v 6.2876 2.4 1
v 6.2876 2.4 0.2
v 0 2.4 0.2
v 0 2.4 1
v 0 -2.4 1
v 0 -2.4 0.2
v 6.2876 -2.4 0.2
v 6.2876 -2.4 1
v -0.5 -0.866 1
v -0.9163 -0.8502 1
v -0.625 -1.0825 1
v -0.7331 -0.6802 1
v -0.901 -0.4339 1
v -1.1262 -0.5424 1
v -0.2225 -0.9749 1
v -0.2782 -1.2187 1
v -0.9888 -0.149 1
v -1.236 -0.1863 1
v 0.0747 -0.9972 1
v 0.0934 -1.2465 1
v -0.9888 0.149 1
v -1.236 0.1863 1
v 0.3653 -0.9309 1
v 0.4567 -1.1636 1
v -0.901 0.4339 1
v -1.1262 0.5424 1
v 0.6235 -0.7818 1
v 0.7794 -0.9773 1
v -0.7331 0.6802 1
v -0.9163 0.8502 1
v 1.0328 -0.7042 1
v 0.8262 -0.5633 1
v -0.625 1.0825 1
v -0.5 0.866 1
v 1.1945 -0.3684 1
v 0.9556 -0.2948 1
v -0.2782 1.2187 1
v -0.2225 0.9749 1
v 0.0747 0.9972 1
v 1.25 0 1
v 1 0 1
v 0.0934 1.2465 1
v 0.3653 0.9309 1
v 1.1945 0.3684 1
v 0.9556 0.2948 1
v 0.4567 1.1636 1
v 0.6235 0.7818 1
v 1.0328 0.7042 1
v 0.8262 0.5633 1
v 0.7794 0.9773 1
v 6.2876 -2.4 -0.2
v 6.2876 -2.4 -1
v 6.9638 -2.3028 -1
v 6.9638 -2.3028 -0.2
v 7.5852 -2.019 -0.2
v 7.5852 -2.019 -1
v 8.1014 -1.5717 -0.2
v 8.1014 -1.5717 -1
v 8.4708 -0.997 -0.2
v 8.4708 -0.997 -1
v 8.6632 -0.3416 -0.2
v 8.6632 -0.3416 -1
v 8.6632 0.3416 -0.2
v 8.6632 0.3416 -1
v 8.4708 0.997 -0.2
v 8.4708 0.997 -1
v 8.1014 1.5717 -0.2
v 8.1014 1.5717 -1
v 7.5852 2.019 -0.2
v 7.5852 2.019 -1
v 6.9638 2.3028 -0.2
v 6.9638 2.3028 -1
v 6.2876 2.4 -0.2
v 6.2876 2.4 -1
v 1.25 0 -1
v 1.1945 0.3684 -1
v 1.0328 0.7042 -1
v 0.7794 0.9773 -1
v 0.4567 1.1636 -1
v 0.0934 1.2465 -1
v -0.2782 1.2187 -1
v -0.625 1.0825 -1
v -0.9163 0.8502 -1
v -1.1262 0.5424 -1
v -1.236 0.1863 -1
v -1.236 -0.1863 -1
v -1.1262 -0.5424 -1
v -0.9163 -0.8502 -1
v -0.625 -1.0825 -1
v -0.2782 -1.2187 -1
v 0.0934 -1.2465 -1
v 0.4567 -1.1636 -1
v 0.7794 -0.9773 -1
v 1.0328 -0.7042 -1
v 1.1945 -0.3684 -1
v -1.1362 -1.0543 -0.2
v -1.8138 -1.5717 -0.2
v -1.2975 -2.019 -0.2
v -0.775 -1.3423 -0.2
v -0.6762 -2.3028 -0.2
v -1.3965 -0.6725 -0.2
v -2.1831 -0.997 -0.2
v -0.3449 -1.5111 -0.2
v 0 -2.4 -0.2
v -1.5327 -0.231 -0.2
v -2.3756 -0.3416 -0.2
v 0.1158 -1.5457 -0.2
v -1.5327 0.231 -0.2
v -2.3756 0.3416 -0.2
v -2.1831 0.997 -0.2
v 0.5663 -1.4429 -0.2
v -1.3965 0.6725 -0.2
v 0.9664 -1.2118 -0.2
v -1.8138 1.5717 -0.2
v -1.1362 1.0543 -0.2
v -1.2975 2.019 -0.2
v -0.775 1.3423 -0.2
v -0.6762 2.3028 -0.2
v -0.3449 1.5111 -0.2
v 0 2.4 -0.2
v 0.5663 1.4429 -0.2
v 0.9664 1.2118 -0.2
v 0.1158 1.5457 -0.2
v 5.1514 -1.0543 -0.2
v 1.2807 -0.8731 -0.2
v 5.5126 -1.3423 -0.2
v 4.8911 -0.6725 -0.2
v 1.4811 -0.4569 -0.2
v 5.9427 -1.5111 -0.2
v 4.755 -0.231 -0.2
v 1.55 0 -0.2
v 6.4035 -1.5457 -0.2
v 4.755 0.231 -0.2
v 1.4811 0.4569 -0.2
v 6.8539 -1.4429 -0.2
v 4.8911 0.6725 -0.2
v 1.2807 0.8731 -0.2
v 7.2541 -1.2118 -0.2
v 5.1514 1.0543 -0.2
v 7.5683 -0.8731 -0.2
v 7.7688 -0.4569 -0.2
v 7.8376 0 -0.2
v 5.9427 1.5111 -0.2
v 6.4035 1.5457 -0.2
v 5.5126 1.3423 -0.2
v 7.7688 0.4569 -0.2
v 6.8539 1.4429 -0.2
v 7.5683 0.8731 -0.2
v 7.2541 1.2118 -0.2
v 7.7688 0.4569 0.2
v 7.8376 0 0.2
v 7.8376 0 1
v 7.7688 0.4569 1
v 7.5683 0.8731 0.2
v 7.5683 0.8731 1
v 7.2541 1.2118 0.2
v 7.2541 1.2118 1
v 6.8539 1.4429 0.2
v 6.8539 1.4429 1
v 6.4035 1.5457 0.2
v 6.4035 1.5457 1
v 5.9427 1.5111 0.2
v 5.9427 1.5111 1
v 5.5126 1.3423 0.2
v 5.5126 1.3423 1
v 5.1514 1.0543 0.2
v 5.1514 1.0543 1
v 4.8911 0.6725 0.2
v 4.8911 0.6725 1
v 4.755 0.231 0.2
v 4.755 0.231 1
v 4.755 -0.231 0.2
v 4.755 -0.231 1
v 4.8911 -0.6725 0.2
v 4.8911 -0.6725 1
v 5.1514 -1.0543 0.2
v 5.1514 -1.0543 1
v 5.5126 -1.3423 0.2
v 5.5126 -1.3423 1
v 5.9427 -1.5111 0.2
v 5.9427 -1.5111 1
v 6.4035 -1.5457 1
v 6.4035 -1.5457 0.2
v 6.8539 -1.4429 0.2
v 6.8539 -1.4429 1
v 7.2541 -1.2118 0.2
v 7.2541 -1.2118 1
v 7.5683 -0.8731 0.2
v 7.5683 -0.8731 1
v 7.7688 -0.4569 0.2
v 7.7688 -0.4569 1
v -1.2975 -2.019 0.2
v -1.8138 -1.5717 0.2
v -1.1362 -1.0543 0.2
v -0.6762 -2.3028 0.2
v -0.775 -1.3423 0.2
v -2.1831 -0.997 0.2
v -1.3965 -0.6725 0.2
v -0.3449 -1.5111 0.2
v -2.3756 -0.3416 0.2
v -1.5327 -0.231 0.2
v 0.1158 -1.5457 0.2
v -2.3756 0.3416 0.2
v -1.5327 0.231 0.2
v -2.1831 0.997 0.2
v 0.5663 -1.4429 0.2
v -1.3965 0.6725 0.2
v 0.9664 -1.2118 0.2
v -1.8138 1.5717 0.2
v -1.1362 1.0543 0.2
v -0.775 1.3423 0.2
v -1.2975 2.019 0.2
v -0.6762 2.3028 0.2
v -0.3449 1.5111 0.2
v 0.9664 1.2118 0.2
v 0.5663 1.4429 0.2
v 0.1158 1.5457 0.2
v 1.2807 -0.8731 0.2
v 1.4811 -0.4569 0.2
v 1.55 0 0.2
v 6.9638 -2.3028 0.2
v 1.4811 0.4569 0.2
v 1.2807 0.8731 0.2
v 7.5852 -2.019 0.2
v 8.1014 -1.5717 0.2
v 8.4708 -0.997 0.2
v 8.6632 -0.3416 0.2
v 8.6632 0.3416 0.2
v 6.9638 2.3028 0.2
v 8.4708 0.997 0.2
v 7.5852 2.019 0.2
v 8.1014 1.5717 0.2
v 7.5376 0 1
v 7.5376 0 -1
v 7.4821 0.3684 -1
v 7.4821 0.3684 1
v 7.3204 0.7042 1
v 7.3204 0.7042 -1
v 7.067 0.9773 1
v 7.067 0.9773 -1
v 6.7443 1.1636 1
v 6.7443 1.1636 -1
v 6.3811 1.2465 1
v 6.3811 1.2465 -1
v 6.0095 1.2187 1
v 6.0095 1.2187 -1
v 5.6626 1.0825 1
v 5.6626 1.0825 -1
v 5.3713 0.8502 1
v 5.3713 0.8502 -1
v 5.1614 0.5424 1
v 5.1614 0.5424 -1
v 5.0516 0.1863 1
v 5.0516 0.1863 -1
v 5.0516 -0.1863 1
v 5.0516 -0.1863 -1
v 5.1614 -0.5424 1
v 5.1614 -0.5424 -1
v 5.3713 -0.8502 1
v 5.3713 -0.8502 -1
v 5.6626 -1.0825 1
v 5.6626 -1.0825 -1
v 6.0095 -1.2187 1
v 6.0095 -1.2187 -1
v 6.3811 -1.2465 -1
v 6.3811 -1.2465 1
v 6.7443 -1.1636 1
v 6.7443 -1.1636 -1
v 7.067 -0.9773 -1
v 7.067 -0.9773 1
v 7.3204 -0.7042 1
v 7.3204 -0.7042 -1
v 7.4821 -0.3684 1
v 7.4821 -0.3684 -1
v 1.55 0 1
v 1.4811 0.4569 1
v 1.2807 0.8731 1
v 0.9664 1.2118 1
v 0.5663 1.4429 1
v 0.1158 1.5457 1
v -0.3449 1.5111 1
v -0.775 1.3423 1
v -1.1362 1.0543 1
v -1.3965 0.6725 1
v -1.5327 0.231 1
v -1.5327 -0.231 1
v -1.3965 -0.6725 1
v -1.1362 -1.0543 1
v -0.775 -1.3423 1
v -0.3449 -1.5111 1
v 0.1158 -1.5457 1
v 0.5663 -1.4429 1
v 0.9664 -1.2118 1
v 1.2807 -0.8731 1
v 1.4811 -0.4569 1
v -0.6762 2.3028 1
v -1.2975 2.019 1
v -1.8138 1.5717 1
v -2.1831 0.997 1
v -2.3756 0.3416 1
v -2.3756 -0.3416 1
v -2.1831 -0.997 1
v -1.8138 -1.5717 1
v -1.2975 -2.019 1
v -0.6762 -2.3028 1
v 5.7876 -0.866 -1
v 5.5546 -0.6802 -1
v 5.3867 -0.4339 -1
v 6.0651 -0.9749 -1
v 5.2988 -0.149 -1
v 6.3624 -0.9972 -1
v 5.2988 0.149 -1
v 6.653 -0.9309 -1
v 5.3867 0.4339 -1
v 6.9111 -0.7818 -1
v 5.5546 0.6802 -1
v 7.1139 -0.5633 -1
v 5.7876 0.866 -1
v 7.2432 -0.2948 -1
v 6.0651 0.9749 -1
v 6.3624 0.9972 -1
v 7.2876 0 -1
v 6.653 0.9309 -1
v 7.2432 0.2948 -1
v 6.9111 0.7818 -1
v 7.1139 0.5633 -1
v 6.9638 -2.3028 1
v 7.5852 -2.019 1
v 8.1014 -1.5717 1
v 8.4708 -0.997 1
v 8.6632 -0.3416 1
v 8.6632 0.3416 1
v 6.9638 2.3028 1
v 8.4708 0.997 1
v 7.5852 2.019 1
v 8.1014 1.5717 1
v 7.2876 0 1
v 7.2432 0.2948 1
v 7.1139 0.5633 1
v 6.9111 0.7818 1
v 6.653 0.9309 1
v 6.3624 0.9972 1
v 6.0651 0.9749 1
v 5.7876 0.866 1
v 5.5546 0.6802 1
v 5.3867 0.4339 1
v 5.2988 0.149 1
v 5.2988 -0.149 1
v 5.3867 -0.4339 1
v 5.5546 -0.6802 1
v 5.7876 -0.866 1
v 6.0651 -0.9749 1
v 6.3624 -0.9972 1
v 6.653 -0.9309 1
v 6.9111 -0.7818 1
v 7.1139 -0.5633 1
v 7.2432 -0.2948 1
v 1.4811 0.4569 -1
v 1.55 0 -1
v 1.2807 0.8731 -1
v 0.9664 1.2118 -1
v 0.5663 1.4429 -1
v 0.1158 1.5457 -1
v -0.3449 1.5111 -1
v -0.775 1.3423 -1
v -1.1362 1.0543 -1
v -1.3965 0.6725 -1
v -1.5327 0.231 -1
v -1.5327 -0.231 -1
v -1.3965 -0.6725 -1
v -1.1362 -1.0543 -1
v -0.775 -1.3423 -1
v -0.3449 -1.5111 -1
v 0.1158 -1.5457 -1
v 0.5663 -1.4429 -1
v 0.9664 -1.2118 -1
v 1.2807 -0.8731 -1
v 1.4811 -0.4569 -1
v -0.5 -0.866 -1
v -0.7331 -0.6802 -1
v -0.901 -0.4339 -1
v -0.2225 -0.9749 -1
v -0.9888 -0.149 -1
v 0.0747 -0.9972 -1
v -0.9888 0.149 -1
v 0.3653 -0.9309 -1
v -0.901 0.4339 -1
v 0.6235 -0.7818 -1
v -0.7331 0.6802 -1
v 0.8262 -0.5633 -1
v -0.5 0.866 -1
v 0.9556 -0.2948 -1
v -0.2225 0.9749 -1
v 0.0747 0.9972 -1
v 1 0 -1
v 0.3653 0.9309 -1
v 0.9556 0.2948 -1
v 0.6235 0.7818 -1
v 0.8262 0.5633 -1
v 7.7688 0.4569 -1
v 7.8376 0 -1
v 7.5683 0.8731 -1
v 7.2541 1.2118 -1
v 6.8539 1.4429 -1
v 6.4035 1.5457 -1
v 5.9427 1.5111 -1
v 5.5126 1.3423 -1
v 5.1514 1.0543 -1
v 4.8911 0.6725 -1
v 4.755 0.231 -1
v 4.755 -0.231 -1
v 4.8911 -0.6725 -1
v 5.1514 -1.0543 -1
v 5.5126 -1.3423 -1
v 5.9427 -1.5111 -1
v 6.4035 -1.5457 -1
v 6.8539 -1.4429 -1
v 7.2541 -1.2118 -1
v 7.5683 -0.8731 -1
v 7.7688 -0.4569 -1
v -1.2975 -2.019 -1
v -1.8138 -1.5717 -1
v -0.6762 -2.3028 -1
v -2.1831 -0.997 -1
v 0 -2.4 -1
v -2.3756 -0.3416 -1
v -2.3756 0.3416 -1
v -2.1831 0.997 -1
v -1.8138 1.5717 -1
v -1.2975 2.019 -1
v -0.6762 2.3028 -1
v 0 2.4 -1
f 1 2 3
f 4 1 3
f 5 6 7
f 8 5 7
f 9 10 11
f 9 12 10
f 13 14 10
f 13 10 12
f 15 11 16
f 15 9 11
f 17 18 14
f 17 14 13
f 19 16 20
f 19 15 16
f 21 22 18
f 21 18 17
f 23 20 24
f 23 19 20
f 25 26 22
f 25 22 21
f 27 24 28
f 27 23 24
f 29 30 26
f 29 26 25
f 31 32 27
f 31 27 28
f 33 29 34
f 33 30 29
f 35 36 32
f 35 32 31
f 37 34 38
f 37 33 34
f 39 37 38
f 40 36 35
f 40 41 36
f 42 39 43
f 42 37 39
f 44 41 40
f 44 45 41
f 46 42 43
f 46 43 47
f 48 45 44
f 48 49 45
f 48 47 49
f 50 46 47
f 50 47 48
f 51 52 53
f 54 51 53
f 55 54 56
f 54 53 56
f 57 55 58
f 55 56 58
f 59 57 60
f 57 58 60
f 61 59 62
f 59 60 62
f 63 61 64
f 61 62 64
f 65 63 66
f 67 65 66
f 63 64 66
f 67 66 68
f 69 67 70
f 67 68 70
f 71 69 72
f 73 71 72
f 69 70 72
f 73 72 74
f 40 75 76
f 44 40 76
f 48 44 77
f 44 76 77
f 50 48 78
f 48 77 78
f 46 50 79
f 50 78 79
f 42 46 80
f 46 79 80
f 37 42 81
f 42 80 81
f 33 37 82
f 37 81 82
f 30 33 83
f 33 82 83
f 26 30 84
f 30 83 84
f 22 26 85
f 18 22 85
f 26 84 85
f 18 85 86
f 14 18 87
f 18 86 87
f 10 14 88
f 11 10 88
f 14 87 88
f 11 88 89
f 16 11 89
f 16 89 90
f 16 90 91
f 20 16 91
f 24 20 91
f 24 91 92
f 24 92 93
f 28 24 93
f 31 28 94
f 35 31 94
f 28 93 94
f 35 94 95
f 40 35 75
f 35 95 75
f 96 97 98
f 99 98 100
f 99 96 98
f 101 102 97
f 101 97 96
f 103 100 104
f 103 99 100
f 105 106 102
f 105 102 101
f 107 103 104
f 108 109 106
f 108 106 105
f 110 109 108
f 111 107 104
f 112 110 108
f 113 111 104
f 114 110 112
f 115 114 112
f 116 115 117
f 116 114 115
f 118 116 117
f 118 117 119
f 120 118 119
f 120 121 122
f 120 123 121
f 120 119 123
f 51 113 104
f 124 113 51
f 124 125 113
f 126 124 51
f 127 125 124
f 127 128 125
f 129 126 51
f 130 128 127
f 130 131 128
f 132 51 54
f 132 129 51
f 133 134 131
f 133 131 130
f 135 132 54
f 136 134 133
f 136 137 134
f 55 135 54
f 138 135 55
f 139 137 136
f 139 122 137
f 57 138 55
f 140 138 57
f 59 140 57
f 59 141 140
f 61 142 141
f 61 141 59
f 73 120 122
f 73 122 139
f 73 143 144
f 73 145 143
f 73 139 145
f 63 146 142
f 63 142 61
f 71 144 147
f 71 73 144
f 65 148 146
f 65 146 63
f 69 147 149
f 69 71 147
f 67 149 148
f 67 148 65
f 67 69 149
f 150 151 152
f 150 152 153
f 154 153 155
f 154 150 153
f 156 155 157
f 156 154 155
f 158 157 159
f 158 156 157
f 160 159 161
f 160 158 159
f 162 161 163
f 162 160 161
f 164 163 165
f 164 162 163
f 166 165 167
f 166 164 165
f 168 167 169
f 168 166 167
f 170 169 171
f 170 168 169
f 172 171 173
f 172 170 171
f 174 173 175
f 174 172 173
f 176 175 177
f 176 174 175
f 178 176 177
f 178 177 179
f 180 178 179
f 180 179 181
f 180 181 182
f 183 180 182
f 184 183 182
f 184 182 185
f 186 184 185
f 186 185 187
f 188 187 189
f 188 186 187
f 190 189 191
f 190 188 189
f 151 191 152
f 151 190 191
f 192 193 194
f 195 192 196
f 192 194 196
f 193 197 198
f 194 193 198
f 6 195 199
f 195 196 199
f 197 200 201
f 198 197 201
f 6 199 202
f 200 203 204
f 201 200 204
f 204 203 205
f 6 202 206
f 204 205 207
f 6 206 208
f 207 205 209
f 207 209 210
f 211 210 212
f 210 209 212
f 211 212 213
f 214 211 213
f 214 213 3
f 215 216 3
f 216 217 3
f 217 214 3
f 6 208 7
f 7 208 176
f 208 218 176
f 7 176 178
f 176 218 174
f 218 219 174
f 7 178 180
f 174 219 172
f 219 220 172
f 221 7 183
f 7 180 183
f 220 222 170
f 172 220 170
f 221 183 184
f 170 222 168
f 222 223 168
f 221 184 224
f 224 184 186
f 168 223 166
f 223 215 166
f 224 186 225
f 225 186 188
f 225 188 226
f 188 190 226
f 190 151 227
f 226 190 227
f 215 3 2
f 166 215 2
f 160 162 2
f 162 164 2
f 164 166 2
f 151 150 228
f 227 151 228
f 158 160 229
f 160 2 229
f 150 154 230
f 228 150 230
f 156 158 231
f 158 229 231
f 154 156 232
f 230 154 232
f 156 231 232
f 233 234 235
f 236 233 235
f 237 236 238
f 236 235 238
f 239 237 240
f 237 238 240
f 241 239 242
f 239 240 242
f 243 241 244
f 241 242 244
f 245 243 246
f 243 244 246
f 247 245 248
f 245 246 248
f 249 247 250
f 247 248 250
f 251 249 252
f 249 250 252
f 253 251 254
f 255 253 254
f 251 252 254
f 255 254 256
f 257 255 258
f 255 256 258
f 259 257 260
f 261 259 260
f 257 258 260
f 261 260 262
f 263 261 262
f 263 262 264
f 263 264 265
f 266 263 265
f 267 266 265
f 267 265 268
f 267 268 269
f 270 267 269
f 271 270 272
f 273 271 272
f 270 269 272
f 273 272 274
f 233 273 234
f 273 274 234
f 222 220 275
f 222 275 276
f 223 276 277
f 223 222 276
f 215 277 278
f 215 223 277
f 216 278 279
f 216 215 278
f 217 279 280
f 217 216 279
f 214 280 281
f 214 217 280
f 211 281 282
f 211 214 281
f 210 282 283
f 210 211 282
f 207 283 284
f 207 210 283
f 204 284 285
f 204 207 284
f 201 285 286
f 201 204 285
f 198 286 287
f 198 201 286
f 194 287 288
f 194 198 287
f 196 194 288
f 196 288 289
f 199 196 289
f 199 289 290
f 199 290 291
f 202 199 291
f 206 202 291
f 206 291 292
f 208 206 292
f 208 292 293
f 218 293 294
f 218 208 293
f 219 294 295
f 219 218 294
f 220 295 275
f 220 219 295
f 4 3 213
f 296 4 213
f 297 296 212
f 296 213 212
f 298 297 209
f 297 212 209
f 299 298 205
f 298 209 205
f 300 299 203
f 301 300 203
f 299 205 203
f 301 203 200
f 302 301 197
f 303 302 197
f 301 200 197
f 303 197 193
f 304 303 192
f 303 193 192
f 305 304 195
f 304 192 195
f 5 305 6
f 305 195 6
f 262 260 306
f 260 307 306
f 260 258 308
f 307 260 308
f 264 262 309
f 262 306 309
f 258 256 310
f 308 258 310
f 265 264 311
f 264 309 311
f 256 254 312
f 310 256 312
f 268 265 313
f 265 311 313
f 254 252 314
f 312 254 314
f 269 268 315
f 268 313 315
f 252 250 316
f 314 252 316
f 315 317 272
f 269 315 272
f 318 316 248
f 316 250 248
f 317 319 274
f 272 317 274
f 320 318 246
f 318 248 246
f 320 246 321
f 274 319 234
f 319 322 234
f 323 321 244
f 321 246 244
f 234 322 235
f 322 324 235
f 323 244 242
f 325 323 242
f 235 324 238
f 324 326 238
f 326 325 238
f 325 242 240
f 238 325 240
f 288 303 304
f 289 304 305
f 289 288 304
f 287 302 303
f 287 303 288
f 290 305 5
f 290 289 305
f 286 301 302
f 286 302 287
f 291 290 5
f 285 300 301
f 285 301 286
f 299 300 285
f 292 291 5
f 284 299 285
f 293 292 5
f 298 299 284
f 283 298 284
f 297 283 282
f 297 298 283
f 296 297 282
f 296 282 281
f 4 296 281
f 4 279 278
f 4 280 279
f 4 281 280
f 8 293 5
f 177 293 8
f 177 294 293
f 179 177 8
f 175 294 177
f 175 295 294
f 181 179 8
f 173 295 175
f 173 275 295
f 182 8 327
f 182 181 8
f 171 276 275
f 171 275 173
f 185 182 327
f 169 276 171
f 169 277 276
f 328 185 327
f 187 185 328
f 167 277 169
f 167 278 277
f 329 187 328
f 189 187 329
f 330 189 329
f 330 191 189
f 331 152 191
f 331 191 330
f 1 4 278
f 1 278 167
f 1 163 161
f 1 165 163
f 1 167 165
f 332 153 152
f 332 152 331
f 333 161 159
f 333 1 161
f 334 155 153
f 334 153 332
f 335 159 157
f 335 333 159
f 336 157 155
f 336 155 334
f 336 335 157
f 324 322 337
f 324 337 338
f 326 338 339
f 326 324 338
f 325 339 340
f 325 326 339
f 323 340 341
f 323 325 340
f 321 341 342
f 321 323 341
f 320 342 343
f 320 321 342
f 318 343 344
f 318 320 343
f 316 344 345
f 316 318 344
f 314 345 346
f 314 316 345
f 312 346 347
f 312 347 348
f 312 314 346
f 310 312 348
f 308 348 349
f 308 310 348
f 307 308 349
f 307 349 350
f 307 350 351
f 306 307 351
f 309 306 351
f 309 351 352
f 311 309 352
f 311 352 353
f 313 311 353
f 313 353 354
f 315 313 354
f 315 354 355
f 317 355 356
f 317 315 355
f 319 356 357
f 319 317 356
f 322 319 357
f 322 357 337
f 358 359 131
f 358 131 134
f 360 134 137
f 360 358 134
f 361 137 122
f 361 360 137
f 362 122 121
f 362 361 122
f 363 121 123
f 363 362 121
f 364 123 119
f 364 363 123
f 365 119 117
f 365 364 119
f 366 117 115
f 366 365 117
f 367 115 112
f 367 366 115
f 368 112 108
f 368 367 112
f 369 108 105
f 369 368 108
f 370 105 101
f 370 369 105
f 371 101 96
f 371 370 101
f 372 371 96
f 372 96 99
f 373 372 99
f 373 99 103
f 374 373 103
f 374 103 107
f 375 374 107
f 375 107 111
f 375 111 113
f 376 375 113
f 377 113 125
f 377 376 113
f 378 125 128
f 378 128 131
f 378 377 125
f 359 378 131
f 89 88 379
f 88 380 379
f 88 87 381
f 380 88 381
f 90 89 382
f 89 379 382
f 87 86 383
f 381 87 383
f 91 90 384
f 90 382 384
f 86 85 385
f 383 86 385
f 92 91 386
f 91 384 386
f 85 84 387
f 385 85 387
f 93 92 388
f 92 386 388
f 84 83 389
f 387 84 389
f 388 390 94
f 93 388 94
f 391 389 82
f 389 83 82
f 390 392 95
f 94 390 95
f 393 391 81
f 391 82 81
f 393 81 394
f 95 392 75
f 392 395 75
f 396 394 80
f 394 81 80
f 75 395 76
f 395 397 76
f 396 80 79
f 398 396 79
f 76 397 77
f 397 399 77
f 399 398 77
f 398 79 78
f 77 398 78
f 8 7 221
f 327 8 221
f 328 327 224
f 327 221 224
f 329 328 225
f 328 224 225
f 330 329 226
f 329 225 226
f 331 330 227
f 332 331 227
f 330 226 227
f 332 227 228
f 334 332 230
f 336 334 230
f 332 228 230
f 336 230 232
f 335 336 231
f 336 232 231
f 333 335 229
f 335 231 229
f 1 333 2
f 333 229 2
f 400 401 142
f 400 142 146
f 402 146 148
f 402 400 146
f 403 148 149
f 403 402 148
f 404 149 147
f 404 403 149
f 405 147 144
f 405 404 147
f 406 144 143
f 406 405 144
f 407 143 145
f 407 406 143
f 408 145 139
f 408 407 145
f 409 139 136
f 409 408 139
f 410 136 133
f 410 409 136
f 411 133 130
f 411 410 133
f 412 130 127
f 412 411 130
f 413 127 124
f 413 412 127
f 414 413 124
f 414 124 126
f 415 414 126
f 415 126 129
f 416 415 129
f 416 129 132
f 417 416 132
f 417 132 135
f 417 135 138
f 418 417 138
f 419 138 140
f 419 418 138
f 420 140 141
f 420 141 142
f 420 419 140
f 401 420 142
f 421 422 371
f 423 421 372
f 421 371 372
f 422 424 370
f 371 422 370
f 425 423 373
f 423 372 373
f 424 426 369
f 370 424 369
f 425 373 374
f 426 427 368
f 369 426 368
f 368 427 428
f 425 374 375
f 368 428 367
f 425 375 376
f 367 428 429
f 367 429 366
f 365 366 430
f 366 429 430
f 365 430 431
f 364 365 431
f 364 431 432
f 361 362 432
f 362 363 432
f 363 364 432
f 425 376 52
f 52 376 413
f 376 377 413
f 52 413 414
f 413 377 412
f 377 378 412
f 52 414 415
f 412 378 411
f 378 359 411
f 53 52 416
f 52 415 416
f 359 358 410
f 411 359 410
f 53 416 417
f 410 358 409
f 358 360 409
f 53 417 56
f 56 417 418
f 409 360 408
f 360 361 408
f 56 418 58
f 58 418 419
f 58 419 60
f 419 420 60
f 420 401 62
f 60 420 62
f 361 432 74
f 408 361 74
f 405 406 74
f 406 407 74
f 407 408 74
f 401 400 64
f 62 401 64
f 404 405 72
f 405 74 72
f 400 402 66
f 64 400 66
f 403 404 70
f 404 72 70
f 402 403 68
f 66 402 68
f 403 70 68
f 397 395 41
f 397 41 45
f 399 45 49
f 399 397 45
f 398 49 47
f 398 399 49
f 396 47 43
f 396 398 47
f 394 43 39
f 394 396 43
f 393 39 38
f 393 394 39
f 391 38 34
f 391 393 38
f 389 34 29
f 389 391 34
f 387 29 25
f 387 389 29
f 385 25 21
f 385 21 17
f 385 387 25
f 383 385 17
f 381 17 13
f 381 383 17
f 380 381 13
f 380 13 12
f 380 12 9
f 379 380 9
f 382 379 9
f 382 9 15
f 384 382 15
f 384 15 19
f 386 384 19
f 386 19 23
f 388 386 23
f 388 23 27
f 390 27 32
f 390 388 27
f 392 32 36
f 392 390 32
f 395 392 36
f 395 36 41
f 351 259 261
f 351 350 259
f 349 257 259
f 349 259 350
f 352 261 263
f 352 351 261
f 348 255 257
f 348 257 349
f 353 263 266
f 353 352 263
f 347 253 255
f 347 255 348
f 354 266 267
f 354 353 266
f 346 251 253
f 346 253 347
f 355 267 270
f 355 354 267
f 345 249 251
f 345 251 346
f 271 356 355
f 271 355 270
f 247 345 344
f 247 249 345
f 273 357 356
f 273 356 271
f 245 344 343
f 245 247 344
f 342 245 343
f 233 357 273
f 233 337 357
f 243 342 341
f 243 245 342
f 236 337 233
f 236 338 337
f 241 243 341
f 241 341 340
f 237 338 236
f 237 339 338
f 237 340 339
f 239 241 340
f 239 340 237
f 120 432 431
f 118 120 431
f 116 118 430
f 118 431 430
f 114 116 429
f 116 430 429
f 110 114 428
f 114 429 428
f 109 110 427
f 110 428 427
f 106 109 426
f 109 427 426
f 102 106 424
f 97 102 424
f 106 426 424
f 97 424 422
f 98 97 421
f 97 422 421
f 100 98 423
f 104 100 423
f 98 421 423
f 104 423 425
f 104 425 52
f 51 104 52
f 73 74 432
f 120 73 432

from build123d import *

# Parameters (mm, degrees)
BOSS_EXTRUDE1_START   = 0.2
SKETCH1_R             = 1.55
BOSS_EXTRUDE1_DEPTH   = 0.8
BOSS_EXTRUDE2_START   = -1
SKETCH2_R             = 1.55
BOSS_EXTRUDE2_DEPTH   = 0.8
BOSS_EXTRUDE3_START   = -1
SKETCH3_R             = 1.25
SKETCH3_R_2           = 1
BOSS_EXTRUDE3_DEPTH   = 2
BOSS_EXTRUDE3_2_DEPTH = 2


with BuildPart() as part:
    # Sketch1 → Boss-Extrude1 (new body)
    with BuildSketch(Plane.XY.offset(BOSS_EXTRUDE1_START)):
        with BuildLine():
            Line((0, -2.4), (6.287642552, -2.4))
            ThreePointArc((6.287642552, -2.4), (8.687642552, 0), (6.287642552, 2.4))
            Line((6.287642552, 2.4), (0, 2.4))
            ThreePointArc((0, 2.4), (-2.4, 0), (0, -2.4))
        make_face()
        Circle(SKETCH1_R, mode=Mode.SUBTRACT)
        with Locations((6.287642552, 0)):
            Circle(SKETCH1_R, mode=Mode.SUBTRACT)
    extrude(amount=BOSS_EXTRUDE1_DEPTH)


with BuildPart() as body_2:
    # Sketch2 → Boss-Extrude2 (new body)
    with BuildSketch(Plane.XY.offset(BOSS_EXTRUDE2_START)):
        with BuildLine():
            Line((0, -2.4), (6.287642552, -2.4))
            ThreePointArc((6.287642552, -2.4), (8.687642552, 0), (6.287642552, 2.4))
            Line((6.287642552, 2.4), (0, 2.4))
            ThreePointArc((0, 2.4), (-2.4, 0), (0, -2.4))
        make_face()
        Circle(SKETCH2_R, mode=Mode.SUBTRACT)
        with Locations((6.287642552, 0)):
            Circle(SKETCH2_R, mode=Mode.SUBTRACT)
    extrude(amount=BOSS_EXTRUDE2_DEPTH)


with BuildPart() as body_3:
    # Sketch3 → Boss-Extrude3 (new body)
    with BuildSketch(Plane.XY.offset(BOSS_EXTRUDE3_START)):
        Circle(SKETCH3_R)
        Circle(SKETCH3_R_2, mode=Mode.SUBTRACT)
    extrude(amount=BOSS_EXTRUDE3_DEPTH)


with BuildPart() as body_4:
    # Sketch3 → Boss-Extrude3 2 (new body)
    with BuildSketch(Plane.XY.offset(BOSS_EXTRUDE3_START)):
        with Locations((6.287642552, 0)):
            Circle(SKETCH3_R)
        with Locations((6.287642552, 0)):
            Circle(SKETCH3_R_2, mode=Mode.SUBTRACT)
    extrude(amount=BOSS_EXTRUDE3_2_DEPTH)


solid = Compound([part.part, body_2.part, body_3.part, body_4.part])
